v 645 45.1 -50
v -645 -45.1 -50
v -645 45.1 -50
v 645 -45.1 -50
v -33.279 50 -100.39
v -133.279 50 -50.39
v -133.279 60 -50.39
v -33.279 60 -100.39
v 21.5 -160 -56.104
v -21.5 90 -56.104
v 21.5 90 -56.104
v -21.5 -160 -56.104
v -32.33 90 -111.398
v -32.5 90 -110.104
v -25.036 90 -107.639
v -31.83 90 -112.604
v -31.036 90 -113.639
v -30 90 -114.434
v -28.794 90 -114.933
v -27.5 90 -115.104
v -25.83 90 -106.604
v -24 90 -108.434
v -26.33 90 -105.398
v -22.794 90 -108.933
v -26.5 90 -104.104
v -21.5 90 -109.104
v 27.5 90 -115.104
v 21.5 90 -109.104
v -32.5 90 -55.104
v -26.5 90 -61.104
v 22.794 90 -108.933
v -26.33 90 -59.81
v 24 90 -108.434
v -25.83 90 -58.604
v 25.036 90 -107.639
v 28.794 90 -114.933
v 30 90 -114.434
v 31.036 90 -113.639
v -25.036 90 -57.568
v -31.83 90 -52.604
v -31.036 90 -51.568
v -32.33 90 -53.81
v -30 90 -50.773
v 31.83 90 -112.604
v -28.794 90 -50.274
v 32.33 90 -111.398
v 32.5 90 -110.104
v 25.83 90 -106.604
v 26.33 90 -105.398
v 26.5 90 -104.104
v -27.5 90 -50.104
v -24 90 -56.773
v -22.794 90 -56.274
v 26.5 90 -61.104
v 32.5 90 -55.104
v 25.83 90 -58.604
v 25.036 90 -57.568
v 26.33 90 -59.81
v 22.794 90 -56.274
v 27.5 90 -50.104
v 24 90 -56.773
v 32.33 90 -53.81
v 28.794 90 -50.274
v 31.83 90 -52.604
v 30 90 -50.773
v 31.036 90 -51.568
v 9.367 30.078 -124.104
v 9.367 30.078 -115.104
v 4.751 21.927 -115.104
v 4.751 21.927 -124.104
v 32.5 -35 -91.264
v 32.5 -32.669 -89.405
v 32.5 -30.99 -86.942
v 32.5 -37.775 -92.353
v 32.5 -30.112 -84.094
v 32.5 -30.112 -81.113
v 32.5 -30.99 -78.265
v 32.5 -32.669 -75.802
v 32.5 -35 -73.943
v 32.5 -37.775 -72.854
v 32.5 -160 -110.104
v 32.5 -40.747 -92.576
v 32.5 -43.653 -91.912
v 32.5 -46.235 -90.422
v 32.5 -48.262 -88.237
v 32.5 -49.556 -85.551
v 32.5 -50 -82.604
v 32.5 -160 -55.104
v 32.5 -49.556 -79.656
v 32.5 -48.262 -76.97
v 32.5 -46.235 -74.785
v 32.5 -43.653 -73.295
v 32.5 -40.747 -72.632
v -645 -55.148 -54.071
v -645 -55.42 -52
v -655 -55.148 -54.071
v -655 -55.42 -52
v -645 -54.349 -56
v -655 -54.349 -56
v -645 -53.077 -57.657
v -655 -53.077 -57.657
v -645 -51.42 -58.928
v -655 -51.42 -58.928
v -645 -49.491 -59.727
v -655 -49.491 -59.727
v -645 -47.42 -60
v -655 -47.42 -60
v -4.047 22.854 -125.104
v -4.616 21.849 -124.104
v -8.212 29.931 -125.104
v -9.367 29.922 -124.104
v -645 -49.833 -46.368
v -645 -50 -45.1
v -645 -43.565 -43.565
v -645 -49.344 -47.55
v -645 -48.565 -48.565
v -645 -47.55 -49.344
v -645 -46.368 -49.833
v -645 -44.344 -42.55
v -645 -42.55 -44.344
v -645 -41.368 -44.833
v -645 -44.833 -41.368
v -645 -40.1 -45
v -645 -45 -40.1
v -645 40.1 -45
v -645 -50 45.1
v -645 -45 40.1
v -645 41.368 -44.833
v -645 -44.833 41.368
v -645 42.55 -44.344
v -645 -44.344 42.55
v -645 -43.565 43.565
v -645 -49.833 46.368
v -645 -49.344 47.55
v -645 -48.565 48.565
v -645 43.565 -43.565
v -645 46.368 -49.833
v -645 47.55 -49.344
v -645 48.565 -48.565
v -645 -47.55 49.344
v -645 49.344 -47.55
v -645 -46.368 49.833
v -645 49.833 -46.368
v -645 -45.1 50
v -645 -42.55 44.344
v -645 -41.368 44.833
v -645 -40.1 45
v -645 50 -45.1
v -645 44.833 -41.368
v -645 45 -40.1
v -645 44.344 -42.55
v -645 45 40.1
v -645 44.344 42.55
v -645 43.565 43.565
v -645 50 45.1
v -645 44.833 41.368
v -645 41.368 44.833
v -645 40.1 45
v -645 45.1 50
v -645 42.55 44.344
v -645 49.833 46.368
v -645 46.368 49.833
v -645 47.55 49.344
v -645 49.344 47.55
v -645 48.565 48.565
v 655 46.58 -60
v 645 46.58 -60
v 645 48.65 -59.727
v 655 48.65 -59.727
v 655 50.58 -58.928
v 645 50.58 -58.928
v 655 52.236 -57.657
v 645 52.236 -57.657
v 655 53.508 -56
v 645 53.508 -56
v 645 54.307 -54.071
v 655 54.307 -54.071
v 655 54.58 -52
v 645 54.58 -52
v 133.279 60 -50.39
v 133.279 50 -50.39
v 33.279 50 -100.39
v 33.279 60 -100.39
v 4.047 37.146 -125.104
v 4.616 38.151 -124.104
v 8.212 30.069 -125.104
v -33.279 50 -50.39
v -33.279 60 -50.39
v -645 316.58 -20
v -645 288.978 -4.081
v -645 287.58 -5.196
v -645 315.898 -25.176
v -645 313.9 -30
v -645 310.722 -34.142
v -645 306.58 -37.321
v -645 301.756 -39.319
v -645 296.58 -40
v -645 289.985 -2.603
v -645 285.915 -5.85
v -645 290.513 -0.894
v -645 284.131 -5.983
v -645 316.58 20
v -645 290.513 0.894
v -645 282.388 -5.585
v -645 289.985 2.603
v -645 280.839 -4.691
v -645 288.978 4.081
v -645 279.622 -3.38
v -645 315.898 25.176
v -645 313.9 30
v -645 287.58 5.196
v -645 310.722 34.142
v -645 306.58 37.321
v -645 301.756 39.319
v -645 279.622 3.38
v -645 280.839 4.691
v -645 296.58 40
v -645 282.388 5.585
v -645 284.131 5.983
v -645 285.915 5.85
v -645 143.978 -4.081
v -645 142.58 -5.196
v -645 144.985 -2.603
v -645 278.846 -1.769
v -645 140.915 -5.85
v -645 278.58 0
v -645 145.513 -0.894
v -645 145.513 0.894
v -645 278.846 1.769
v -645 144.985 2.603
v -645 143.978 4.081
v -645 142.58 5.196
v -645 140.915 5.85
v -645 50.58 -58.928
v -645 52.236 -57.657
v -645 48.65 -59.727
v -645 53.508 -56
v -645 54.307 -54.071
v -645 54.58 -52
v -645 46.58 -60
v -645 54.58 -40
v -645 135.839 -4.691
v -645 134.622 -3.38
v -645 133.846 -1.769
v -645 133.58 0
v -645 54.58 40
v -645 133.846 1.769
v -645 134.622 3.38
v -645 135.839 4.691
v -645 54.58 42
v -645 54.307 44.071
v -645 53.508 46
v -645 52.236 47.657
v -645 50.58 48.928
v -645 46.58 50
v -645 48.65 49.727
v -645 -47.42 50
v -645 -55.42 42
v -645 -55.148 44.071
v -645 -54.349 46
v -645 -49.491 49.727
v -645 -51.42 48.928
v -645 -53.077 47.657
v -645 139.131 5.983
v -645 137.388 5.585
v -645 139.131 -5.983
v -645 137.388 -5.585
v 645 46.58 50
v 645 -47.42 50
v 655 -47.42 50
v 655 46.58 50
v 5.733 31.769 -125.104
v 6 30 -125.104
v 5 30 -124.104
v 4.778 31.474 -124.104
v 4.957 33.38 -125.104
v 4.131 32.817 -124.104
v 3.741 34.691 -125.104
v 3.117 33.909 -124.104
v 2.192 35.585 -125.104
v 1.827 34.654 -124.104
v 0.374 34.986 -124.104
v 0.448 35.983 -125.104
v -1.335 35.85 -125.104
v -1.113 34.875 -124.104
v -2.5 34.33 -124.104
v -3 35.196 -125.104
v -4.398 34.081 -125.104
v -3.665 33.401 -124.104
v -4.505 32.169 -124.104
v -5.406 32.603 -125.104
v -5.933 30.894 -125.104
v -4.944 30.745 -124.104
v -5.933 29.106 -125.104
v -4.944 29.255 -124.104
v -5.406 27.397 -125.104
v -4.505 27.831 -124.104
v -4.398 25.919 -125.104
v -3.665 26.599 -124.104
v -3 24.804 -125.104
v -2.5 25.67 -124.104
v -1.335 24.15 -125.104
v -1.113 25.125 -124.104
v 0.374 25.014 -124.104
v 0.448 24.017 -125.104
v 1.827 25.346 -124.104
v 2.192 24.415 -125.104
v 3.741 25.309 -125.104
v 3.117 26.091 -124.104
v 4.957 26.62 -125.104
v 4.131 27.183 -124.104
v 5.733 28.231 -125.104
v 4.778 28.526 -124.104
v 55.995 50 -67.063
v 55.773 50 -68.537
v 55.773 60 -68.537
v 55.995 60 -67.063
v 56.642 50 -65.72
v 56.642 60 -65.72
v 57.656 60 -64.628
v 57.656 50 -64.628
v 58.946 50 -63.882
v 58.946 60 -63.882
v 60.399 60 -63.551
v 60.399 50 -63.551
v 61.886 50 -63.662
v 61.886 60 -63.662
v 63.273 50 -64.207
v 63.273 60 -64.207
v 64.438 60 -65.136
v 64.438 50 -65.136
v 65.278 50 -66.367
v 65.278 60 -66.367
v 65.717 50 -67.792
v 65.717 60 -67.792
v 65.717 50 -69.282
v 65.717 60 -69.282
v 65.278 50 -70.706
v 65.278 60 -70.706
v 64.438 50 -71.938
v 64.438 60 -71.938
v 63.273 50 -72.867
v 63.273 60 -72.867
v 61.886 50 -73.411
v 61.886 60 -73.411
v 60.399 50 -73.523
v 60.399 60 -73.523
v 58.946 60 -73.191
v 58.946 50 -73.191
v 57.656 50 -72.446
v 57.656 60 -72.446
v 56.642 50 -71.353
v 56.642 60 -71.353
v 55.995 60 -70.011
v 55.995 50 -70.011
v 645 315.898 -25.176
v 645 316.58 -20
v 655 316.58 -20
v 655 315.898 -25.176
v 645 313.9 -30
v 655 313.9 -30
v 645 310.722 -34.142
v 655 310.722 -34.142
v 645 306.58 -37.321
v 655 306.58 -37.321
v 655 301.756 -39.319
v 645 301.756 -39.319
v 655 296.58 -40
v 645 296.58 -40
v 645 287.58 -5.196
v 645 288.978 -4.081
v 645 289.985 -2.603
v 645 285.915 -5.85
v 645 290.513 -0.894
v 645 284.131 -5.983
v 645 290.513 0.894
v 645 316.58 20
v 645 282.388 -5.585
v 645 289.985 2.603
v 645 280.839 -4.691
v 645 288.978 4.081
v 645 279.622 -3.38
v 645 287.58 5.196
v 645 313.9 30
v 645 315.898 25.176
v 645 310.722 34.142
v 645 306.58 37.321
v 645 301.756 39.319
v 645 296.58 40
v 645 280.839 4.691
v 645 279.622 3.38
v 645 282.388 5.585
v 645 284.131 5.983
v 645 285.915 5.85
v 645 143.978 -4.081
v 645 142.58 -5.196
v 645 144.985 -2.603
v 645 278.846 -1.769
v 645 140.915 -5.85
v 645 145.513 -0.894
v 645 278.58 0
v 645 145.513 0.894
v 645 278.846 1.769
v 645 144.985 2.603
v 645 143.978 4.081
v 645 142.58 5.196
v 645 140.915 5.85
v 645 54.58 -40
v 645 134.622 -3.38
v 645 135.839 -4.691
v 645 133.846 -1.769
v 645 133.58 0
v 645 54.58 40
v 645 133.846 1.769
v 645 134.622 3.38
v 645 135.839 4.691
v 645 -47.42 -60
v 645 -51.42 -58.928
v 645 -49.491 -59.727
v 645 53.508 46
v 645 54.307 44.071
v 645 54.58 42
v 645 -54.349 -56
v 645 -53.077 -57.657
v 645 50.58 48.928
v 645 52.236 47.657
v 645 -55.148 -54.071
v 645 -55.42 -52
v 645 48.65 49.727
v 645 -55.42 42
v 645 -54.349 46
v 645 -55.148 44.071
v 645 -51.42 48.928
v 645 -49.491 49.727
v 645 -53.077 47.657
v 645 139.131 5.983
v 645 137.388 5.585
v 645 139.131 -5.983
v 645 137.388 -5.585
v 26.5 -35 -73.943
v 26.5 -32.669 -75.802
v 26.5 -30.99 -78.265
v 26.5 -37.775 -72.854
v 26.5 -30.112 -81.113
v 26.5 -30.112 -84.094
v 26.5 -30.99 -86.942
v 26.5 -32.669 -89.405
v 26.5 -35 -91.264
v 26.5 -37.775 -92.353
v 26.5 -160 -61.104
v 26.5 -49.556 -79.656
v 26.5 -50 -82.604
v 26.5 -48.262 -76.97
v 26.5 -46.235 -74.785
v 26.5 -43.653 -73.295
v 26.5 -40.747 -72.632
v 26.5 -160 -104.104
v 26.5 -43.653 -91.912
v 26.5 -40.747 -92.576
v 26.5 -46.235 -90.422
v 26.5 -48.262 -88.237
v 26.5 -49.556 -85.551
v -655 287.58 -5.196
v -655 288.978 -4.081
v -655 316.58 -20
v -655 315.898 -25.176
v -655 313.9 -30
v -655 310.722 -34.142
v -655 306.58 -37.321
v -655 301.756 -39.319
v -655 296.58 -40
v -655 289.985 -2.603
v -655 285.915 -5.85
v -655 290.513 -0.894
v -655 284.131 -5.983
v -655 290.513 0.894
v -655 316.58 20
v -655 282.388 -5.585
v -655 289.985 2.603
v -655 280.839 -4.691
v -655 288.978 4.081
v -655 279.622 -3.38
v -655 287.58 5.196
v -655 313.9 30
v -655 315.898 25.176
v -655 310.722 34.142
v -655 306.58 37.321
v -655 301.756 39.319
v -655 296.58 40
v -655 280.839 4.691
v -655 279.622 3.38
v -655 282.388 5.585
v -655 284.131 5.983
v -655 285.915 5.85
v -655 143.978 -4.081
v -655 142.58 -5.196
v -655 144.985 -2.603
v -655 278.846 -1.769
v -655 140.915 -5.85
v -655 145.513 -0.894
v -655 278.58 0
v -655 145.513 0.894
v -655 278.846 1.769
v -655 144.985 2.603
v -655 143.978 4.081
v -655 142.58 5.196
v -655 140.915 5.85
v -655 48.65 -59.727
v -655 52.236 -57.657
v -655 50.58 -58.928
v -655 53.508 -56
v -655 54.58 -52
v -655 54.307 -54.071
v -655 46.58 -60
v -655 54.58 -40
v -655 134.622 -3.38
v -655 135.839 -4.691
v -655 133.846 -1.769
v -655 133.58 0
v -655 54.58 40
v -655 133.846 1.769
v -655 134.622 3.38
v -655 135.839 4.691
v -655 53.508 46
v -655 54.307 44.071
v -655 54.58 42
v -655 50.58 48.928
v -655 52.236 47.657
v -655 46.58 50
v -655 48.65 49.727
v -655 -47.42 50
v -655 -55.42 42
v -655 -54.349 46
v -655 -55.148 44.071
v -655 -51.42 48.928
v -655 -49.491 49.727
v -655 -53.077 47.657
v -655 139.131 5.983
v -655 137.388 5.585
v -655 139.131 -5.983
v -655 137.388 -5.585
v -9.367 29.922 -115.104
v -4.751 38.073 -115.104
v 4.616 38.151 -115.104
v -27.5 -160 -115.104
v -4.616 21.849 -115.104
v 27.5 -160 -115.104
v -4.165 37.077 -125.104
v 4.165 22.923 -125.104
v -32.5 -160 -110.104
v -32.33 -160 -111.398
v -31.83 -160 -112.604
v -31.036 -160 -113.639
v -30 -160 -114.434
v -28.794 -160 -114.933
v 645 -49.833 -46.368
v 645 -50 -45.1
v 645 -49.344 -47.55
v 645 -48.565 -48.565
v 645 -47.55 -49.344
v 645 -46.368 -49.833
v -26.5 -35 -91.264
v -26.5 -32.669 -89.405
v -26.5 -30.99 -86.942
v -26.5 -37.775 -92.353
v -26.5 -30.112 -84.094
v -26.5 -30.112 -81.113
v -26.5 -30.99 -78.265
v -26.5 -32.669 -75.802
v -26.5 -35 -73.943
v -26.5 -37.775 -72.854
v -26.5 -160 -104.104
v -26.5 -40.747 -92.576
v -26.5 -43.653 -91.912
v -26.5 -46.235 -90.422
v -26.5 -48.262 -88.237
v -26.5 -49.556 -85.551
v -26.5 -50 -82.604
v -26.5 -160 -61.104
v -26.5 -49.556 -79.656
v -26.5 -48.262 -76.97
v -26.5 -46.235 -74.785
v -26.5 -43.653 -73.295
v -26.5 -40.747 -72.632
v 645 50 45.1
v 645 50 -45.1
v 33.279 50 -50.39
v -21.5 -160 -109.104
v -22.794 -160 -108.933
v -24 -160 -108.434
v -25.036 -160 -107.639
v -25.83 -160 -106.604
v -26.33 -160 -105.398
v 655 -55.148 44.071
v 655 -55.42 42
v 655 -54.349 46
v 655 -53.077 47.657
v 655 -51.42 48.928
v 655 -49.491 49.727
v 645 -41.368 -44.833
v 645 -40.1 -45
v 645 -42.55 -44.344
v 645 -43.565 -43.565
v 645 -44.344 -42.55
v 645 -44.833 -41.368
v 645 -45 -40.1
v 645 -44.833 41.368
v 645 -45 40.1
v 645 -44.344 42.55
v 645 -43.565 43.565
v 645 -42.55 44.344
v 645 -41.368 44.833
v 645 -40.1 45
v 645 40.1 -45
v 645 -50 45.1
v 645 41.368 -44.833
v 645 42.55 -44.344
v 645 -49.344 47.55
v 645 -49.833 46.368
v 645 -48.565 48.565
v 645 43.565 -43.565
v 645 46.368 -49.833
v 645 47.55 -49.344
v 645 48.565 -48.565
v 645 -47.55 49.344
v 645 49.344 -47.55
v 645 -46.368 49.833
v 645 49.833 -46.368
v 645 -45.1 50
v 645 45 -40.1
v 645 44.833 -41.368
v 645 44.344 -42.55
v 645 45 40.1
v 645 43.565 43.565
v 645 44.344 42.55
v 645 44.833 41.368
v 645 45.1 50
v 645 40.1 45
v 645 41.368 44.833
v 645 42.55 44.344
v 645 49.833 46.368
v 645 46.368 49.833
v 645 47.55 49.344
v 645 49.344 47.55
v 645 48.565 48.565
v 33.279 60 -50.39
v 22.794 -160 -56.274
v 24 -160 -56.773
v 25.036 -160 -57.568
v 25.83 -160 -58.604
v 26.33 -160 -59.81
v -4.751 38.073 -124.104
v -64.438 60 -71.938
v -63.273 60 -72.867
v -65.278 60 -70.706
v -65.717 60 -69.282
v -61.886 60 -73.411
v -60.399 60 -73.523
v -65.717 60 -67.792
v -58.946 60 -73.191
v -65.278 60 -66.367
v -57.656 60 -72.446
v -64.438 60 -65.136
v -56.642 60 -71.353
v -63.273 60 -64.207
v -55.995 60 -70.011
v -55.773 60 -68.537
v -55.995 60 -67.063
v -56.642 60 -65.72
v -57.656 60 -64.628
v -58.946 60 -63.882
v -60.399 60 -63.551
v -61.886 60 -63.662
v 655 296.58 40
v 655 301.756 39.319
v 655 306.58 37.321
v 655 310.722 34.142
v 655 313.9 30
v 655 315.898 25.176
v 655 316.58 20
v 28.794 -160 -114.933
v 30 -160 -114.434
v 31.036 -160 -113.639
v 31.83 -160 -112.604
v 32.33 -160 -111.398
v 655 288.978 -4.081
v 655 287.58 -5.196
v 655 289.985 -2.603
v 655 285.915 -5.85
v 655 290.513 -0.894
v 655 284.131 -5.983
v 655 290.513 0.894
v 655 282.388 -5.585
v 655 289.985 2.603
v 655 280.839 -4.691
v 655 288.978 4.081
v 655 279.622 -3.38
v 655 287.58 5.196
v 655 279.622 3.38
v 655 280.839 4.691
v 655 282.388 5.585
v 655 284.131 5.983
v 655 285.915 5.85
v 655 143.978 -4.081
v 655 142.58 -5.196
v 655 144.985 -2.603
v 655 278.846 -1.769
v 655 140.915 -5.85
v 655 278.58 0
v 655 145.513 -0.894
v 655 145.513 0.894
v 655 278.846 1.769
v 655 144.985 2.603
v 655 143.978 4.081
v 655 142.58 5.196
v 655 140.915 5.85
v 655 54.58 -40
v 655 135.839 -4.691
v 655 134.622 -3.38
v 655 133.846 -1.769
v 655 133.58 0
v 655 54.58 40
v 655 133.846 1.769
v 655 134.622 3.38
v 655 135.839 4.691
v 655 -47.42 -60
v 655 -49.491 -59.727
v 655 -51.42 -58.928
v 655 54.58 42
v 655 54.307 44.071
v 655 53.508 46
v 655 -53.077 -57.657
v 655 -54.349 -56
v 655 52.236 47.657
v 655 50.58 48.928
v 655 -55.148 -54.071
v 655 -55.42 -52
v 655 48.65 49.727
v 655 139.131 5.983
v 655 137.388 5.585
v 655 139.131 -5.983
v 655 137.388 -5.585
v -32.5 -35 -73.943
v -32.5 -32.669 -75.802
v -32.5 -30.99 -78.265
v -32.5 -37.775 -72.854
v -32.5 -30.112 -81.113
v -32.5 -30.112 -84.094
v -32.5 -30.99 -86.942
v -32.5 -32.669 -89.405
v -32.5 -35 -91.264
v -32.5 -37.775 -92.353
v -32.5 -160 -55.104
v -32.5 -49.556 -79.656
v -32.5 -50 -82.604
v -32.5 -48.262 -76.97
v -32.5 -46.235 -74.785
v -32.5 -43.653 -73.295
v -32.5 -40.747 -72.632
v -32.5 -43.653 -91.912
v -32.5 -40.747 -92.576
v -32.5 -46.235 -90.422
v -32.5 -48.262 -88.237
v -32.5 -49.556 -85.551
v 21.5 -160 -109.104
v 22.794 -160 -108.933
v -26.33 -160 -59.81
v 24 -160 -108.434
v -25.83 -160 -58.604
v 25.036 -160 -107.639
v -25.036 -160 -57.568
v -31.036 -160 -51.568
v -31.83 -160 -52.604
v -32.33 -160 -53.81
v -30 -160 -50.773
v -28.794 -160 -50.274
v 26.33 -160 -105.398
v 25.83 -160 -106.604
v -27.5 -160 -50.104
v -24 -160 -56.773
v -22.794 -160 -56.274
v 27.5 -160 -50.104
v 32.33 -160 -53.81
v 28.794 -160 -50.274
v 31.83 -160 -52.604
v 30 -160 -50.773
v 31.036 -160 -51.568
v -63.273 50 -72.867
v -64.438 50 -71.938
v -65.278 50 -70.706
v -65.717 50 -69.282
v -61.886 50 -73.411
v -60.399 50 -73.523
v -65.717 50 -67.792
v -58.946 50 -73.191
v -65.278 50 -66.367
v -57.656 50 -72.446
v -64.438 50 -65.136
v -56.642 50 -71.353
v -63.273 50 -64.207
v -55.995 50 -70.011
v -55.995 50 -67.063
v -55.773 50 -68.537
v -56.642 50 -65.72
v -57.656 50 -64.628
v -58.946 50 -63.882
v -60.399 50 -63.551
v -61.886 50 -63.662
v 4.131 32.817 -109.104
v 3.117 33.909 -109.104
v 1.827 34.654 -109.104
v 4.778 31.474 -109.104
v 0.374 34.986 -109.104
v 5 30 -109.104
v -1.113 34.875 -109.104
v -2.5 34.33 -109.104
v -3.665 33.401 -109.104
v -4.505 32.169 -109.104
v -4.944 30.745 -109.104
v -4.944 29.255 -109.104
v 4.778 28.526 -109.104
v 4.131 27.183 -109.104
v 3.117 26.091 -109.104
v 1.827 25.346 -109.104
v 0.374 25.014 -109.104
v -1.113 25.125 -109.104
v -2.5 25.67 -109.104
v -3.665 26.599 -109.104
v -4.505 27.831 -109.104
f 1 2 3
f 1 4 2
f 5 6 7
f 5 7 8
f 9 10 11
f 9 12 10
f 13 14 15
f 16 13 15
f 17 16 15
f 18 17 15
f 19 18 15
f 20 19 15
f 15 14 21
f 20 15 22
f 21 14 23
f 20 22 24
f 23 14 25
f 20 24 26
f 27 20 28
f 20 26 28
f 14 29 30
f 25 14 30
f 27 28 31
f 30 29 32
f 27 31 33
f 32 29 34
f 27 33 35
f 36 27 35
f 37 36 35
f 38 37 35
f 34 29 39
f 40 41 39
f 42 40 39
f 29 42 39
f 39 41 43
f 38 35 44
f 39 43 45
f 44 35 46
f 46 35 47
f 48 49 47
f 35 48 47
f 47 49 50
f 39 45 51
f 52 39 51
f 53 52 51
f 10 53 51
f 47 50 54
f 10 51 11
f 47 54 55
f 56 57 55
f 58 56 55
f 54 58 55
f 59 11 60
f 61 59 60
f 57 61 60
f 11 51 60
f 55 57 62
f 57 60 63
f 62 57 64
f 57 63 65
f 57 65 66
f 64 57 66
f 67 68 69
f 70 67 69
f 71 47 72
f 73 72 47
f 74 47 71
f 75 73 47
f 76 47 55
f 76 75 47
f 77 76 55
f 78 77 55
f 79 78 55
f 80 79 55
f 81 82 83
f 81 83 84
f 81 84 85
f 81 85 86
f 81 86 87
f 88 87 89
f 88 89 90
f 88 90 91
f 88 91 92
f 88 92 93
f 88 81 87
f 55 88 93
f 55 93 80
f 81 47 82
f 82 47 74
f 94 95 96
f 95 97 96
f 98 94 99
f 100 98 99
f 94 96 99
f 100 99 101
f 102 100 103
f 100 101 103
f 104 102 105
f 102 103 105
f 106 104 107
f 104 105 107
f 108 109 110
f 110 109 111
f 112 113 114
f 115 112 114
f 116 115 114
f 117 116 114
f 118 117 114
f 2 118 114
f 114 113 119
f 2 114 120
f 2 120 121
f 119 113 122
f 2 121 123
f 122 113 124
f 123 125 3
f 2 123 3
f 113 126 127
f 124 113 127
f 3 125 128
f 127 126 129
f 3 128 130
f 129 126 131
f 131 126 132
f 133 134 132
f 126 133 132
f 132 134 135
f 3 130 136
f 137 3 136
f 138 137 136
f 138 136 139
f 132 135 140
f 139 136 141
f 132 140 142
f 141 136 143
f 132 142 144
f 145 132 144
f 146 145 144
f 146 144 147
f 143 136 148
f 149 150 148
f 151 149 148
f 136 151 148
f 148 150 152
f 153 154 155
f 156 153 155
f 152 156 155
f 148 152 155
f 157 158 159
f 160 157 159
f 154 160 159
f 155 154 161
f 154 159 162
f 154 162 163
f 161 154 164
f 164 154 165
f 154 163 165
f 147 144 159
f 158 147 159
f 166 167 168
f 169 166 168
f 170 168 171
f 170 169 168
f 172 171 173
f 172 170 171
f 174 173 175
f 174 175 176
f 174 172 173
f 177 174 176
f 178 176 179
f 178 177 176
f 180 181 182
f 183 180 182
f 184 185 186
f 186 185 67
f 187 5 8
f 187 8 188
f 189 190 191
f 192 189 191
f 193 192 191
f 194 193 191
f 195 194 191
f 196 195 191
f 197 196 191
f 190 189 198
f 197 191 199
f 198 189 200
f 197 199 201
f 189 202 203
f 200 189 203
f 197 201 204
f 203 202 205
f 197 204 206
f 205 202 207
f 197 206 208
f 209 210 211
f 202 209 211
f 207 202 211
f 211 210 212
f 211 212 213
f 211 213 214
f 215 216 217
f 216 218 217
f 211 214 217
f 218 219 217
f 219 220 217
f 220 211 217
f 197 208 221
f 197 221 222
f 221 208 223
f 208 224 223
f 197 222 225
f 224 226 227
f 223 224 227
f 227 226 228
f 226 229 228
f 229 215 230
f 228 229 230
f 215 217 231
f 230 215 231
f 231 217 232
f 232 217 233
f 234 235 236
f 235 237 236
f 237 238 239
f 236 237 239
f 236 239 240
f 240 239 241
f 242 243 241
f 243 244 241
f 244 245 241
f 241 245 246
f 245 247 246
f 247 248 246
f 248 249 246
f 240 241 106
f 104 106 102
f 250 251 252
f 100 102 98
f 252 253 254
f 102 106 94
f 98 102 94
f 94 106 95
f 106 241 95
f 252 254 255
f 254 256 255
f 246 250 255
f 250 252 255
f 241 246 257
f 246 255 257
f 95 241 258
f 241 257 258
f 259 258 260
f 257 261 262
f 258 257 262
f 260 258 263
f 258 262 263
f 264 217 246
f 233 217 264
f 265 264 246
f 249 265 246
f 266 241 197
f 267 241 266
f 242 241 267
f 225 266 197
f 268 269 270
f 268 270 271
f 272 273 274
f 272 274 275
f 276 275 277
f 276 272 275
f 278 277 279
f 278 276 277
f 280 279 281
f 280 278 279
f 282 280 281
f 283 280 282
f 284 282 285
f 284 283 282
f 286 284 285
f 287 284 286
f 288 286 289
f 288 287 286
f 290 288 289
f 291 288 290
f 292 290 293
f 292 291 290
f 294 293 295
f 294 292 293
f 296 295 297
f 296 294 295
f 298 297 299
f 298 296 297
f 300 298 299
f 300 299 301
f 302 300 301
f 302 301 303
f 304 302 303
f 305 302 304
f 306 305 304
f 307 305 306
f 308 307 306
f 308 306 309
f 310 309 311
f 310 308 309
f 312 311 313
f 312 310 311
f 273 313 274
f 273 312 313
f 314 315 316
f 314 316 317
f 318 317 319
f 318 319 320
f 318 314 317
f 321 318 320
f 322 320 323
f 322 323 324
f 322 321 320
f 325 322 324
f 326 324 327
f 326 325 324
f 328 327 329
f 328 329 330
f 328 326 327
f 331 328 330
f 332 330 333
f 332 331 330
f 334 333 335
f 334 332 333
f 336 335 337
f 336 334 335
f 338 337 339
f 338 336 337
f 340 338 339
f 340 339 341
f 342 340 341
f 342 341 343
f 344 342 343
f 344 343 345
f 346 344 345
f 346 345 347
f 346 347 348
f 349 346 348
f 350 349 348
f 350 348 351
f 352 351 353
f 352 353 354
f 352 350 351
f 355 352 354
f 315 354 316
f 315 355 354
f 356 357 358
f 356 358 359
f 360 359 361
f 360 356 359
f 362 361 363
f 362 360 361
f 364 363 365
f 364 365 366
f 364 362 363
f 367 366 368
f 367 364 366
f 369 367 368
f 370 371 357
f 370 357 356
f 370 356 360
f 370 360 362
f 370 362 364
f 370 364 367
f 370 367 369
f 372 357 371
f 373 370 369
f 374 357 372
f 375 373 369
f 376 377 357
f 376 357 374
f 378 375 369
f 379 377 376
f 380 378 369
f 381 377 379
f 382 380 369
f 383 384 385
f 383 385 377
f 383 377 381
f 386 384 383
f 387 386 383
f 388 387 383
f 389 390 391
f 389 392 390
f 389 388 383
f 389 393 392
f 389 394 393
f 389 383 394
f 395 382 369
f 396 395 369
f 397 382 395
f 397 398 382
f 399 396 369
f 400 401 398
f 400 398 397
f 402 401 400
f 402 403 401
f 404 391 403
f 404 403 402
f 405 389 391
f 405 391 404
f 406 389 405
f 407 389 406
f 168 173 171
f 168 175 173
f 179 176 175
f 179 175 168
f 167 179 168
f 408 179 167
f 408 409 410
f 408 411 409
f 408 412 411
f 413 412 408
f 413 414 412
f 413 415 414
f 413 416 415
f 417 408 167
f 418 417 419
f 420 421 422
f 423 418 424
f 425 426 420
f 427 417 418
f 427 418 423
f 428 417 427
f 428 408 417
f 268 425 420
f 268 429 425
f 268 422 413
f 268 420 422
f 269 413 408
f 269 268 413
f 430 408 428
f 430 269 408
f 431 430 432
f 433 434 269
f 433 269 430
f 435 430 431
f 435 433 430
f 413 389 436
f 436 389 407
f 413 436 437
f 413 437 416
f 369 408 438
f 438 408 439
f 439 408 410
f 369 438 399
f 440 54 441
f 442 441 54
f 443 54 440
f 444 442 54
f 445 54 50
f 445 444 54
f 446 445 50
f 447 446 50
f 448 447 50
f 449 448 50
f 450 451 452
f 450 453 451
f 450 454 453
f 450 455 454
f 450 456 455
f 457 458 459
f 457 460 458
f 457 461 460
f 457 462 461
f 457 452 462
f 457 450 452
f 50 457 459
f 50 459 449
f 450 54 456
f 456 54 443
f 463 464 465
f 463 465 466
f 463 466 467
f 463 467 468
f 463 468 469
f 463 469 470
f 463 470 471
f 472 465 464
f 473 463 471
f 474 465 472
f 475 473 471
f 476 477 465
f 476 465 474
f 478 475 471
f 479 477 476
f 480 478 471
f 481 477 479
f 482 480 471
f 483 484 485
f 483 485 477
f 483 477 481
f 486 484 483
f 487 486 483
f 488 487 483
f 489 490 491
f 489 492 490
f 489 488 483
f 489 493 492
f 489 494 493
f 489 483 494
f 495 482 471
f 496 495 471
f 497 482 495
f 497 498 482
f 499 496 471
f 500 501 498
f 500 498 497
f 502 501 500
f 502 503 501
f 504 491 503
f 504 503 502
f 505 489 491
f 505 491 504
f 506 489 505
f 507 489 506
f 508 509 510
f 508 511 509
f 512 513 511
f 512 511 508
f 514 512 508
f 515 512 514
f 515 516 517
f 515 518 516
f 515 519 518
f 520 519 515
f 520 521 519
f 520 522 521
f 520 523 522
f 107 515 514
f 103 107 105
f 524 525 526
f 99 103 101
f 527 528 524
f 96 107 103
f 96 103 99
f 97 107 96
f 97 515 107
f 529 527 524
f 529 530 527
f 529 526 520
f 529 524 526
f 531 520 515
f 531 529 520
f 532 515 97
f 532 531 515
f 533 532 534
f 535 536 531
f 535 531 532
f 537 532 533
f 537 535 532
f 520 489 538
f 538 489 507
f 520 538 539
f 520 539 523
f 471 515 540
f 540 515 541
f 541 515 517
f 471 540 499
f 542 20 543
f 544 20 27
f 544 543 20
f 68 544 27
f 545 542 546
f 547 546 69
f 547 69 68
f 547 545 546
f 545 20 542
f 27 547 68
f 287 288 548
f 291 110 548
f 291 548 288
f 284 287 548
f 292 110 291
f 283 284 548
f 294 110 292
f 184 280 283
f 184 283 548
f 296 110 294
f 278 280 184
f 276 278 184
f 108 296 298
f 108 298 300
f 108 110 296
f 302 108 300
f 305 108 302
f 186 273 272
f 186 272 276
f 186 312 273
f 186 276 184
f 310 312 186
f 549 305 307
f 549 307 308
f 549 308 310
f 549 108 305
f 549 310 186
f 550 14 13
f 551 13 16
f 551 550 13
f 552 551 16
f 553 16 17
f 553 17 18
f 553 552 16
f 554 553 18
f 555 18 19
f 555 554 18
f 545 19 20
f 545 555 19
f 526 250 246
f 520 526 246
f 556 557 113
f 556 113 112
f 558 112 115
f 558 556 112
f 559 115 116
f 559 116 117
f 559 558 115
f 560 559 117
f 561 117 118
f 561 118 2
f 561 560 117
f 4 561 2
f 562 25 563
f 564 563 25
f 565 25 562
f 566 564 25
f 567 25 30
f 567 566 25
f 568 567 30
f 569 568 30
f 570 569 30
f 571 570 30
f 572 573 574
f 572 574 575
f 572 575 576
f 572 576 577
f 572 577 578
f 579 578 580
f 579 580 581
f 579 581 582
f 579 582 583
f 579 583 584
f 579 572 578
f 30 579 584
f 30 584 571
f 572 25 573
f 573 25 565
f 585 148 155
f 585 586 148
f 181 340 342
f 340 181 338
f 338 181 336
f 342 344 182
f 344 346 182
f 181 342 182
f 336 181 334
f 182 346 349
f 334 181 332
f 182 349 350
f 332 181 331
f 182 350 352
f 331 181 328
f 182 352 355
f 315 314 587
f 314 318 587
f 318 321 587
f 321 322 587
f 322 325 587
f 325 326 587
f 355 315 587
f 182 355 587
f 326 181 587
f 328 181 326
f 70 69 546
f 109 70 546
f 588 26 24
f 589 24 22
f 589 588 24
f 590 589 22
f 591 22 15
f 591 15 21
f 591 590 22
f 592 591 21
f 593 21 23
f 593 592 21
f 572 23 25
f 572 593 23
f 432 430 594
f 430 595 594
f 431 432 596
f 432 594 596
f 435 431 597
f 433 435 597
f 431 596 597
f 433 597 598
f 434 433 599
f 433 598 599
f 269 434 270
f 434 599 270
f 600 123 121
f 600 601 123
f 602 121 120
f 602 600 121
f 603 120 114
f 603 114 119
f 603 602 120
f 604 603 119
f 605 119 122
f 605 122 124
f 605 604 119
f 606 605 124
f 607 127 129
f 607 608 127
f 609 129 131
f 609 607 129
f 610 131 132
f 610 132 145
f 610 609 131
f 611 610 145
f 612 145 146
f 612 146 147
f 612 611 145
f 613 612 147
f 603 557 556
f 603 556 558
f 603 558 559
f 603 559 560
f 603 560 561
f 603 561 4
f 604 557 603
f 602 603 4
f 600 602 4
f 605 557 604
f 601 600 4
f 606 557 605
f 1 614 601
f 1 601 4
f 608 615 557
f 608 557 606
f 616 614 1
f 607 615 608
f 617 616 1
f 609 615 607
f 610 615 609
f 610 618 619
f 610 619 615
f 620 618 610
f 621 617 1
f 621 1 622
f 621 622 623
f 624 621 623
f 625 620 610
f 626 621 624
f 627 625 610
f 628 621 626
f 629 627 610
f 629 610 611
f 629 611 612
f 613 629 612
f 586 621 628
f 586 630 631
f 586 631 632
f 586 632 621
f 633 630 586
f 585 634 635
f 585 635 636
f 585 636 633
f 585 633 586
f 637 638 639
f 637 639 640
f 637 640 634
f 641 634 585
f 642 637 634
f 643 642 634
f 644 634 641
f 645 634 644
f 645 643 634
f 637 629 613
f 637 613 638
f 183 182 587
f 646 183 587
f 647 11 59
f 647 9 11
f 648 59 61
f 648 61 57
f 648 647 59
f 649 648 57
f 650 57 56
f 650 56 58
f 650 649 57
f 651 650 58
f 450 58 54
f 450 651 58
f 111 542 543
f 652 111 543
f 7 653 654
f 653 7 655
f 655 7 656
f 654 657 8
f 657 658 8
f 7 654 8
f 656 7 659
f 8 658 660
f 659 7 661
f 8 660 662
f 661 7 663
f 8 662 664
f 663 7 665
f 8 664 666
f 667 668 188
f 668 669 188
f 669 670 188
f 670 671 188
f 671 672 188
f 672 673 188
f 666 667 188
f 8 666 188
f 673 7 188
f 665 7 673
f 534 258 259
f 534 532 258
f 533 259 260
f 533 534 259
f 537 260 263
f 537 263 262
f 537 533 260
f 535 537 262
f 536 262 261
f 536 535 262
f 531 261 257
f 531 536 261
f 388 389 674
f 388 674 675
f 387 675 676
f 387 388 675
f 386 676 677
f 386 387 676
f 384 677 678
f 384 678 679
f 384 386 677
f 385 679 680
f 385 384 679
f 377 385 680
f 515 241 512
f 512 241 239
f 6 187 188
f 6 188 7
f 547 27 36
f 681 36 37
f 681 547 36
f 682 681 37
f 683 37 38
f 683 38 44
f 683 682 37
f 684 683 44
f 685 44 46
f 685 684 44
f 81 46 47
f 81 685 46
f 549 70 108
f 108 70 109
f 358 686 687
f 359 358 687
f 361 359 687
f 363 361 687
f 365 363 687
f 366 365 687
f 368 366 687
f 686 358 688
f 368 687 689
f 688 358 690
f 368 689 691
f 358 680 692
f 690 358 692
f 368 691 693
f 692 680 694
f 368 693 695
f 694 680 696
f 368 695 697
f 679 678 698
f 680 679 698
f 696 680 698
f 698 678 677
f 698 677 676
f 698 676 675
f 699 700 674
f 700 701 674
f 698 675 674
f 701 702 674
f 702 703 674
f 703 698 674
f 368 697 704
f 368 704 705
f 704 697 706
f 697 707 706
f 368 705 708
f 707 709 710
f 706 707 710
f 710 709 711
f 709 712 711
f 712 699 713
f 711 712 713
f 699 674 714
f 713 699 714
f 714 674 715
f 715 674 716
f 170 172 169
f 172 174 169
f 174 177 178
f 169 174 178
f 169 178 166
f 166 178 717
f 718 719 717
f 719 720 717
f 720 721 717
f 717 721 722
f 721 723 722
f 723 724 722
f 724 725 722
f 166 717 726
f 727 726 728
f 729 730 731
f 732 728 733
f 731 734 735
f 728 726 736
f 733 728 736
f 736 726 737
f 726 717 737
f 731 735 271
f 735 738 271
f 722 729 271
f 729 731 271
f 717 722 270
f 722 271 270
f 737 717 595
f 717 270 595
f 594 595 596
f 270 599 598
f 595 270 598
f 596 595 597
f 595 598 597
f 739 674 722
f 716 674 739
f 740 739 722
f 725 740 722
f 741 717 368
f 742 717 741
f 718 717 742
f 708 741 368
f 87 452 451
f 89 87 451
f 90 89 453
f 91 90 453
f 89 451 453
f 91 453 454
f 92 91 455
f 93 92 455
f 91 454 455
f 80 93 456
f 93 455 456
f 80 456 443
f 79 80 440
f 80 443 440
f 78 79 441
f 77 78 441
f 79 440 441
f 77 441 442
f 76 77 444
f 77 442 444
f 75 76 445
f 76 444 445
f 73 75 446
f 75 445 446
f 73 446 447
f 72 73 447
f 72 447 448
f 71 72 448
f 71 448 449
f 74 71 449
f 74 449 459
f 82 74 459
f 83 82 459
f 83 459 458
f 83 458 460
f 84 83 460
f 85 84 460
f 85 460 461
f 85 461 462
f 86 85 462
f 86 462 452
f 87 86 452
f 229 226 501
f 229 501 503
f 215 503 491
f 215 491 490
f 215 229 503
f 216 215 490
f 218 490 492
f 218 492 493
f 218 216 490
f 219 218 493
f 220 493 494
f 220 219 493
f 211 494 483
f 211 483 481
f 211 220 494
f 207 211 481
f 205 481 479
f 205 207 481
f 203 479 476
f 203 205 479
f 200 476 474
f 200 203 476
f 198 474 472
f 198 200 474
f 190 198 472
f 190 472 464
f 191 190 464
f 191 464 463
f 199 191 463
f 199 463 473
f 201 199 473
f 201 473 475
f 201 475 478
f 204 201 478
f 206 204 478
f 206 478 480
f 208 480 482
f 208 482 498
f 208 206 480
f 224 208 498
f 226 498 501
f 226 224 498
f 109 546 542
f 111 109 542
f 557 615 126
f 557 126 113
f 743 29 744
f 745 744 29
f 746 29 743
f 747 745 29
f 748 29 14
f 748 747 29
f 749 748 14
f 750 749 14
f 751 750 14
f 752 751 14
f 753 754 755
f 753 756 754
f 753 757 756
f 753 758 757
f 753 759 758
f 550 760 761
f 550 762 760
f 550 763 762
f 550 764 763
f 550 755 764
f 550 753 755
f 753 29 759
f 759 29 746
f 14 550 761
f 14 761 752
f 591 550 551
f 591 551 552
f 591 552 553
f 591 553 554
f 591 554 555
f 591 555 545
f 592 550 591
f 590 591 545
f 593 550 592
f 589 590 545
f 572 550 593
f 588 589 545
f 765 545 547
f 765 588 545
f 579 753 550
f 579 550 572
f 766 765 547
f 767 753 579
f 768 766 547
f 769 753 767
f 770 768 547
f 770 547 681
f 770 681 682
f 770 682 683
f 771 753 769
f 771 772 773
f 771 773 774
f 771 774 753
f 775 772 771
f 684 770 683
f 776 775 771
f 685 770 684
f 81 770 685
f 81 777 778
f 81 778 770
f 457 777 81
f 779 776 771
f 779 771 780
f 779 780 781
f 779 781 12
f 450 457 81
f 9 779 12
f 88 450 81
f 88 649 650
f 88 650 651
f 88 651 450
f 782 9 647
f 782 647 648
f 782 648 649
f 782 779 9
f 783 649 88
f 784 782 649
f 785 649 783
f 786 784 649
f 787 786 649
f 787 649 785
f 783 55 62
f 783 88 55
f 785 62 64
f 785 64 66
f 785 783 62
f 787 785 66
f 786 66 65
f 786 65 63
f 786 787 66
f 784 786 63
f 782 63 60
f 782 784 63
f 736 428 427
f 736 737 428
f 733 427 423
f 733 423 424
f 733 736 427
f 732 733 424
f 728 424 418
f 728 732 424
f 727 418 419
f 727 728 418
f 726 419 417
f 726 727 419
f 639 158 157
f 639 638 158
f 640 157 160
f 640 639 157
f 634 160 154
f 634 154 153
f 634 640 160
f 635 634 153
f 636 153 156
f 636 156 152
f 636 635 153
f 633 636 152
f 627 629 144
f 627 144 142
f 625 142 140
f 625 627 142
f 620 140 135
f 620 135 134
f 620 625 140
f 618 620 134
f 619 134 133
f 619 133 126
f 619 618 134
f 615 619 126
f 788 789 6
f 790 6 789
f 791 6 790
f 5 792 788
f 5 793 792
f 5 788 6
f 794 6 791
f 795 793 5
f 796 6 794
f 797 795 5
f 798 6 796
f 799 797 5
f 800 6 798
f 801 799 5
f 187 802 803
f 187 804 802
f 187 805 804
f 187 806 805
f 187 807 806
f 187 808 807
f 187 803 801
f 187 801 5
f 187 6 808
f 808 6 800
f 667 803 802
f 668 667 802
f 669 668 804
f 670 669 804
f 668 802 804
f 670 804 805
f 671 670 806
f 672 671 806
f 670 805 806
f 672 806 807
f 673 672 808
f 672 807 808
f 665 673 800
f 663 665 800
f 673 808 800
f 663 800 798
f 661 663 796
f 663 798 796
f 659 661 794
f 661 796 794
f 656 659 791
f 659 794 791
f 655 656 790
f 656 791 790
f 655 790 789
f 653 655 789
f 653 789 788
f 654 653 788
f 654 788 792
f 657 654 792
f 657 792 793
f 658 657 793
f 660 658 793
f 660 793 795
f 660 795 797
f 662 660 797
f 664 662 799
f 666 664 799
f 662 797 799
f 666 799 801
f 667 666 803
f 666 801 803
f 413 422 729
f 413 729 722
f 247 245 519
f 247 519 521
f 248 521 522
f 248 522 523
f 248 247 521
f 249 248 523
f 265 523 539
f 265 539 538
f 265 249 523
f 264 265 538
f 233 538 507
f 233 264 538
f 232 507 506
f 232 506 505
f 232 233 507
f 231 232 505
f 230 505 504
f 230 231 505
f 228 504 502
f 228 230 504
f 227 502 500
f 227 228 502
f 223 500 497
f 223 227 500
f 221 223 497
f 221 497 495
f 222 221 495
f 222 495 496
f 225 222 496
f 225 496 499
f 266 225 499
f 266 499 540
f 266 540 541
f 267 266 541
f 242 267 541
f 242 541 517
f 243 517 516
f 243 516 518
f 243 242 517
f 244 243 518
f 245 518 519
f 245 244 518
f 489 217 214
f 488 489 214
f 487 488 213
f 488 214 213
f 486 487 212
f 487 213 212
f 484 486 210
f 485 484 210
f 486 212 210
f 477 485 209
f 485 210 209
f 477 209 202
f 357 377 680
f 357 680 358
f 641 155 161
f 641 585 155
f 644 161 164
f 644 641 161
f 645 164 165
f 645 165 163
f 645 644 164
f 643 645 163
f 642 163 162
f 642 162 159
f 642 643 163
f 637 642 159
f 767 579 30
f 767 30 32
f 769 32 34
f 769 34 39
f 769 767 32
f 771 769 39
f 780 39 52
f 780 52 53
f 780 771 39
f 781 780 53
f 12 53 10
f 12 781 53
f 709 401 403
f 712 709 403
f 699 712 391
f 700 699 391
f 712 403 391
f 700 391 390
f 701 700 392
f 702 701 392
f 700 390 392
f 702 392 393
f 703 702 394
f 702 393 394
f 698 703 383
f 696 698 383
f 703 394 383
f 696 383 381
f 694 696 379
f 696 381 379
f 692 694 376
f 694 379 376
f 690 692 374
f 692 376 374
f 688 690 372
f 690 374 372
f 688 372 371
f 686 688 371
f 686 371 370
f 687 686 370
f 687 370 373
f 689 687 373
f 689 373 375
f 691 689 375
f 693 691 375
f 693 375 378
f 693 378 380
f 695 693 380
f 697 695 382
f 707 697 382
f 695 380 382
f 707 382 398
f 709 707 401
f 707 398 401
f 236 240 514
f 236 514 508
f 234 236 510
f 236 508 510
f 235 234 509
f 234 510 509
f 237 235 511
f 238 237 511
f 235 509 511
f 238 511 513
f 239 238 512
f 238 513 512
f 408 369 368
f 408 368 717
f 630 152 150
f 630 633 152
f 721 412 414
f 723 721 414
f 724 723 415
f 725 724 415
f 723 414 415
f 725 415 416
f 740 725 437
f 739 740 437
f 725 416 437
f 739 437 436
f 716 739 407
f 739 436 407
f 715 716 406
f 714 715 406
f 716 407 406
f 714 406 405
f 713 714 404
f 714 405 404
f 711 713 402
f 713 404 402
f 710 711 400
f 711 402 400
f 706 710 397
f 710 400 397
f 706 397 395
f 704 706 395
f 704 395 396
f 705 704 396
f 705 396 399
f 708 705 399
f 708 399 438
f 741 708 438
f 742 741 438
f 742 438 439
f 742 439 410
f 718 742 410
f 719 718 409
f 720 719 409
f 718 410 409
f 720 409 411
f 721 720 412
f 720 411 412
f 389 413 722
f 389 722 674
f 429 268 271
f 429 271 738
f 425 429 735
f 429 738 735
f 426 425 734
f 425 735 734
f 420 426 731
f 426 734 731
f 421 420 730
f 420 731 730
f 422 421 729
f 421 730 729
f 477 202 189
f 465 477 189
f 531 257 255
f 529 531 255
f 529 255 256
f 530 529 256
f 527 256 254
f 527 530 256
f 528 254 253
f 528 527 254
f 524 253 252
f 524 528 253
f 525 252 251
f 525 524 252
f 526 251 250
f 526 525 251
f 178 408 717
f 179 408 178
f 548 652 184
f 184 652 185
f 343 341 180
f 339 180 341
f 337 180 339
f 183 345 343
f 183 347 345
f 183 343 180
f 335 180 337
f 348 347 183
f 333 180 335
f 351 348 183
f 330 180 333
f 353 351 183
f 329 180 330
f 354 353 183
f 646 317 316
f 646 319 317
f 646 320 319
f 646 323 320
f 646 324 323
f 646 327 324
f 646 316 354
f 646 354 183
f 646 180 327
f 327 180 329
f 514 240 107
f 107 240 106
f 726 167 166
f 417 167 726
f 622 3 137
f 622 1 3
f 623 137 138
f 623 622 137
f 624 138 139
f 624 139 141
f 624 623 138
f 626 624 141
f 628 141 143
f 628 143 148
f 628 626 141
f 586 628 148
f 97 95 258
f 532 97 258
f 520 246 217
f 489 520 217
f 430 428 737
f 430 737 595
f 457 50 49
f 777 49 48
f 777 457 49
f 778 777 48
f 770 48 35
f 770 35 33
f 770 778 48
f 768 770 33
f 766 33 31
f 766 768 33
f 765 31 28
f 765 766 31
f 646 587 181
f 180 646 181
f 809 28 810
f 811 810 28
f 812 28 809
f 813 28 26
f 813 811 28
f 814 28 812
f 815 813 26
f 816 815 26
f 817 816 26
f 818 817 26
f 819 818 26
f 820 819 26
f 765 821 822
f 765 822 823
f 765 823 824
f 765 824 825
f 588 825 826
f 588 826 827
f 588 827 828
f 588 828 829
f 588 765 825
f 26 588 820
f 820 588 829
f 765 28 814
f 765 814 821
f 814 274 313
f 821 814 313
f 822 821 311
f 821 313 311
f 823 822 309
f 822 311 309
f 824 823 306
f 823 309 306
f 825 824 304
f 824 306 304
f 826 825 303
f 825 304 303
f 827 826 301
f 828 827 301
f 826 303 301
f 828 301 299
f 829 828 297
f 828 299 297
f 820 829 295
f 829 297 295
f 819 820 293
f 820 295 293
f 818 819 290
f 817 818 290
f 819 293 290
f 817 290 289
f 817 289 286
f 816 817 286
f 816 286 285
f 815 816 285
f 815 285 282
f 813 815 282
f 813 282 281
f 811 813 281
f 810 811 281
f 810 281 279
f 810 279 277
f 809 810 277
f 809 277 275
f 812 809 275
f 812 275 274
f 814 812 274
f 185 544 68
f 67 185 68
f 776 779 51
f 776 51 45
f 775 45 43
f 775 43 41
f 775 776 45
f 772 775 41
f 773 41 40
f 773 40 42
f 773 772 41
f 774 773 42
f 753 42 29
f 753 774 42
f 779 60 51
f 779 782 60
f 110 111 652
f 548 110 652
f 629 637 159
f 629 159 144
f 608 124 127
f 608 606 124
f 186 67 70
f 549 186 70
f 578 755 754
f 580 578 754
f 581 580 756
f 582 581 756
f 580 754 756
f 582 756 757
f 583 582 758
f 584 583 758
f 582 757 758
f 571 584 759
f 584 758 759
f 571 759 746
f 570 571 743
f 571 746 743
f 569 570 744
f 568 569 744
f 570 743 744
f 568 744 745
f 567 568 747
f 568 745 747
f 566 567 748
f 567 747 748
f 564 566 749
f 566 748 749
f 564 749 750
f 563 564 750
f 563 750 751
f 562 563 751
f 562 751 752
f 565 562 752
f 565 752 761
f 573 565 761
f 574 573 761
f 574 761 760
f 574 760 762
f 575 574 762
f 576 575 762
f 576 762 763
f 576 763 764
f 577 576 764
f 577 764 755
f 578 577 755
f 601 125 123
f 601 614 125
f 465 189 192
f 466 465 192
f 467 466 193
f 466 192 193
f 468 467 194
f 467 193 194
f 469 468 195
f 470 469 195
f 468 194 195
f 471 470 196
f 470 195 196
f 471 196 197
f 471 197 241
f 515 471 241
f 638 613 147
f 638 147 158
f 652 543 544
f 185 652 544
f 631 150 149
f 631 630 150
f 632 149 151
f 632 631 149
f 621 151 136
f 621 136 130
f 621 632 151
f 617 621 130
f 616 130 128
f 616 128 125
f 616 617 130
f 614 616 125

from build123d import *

# Parameters (mm, degrees)
F1_DEPTH       = 645
F1_DEPTH_BACK  = 645
F2_R           = 6
F3_DEPTH       = 10
F4_R           = 8
F7_DEPTH       = 110
F7_DEPTH_BACK  = 140
F8_R           = 10
F9_DEPTH       = 259
F11_DEPTH      = 10
F12_R          = 5
F13_DEPTH      = 25
F13_DEPTH_BACK = 25.8
F14_SIZE       = 1
F15_R          = 5
F16_DEPTH      = 10


with BuildPart() as f1:
    # F0 (on Right) → F1 (new body, two sides)
    with BuildSketch(Plane.YZ) as f1_sk:
        with BuildLine():
            ThreePointArc((50, 45.1), (48.5648232278, 48.5648232278), (45.1, 50))
            Line((45.1, 50), (-45.1, 50))
            ThreePointArc((-45.1, 50), (-48.5648232278, 48.5648232278), (-50, 45.1))
            Line((-50, 45.1), (-50, -45.1))
            ThreePointArc((-50, -45.1), (-48.5648232278, -48.5648232278), (-45.1, -50))
            Line((-45.1, -50), (45.1, -50))
            ThreePointArc((45.1, -50), (48.5648232278, -48.5648232278), (50, -45.1))
            Line((50, -45.1), (50, 45.1))
        make_face()
        with BuildLine():
            Line((-40.1, 45), (40.1, 45))
            ThreePointArc((40.1, 45), (43.5648232278, 43.5648232278), (45, 40.1))
            Line((45, 40.1), (45, -40.1))
            ThreePointArc((45, -40.1), (43.5648232278, -43.5648232278), (40.1, -45))
            Line((40.1, -45), (-40.1, -45))
            ThreePointArc((-40.1, -45), (-43.5648232278, -43.5648232278), (-45, -40.1))
            Line((-45, -40.1), (-45, 40.1))
            ThreePointArc((-45, 40.1), (-43.5648232278, 43.5648232278), (-40.1, 45))
        make_face(mode=Mode.SUBTRACT)
    extrude(amount=F1_DEPTH)
    extrude(f1_sk.sketch, amount=-F1_DEPTH_BACK)


with BuildPart() as f3:
    # F2 (on face) → F3 (new body)
    with BuildSketch(Plane(origin=(-645, 0, 0), x_dir=(0, -1, 0), z_dir=(-1, 0, 0))):
        with BuildLine():
            Line((55.4204173386, -60), (55.4204173386, 50))
            Line((55.4204173386, 50), (-54.5795826614, 50))
            Line((-54.5795826614, 50), (-54.5795826614, 40))
            Line((-54.5795826614, 40), (-296.5795826614, 40))
            ThreePointArc((-296.5795826614, 40), (-310.7217182851, 34.1421356237), (-316.5795826614, 20))
            Line((-316.5795826614, 20), (-316.5795826614, -20))
            ThreePointArc((-316.5795826614, -20), (-310.7217182851, -34.1421356237), (-296.5795826614, -40))
            Line((-296.5795826614, -40), (-54.5795826614, -40))
            Line((-54.5795826614, -40), (-54.5795826614, -60))
            Line((-54.5795826614, -60), (55.4204173386, -60))
        make_face()
        with Locations((-284.5795826614, 0)):
            Circle(F2_R, mode=Mode.SUBTRACT)
        with Locations((-139.5795826614, 0)):
            Circle(F2_R, mode=Mode.SUBTRACT)
    extrude(amount=F3_DEPTH)

    # F4
    f4_edges = [f3.edges().sort_by_distance(p)[0] for p in [
        (-650, 54.579583, 50),
        (-650, -55.420417, 50),
        (-650, -55.420417, -60),
        (-650, 54.579583, -60),
    ]]
    fillet(f4_edges, radius=F4_R)


with BuildPart() as f5_1:
    # F5: instance of F3
    add(f3.part.mirror(Plane.YZ))


with BuildPart() as f7:
    # F6 (on face) → F7 (new body, two sides)
    with BuildSketch(Plane.XZ.offset(50)) as f7_sk:
        with BuildLine():
            Line((27.5, -50.103611052), (-27.5, -50.103611052))
            ThreePointArc((-27.5, -50.103611052), (-31.0355339059, -51.5680771461), (-32.5, -55.103611052))
            Line((-32.5, -55.103611052), (-32.5, -110.103611052))
            ThreePointArc((-32.5, -110.103611052), (-31.0355339059, -113.639144958), (-27.5, -115.103611052))
            Line((-27.5, -115.103611052), (27.5, -115.103611052))
            ThreePointArc((27.5, -115.103611052), (31.0355339059, -113.639144958), (32.5, -110.103611052))
            Line((32.5, -110.103611052), (32.5, -55.103611052))
            ThreePointArc((32.5, -55.103611052), (31.0355339059, -51.5680771461), (27.5, -50.103611052))
        make_face()
        with BuildLine():
            ThreePointArc((-26.5, -61.103611052), (-25.0355339059, -57.5680771461), (-21.5, -56.103611052))
            Line((-21.5, -56.103611052), (21.5, -56.103611052))
            ThreePointArc((21.5, -56.103611052), (25.0355339059, -57.5680771461), (26.5, -61.103611052))
            Line((26.5, -61.103611052), (26.5, -104.103611052))
            ThreePointArc((26.5, -104.103611052), (25.0355339059, -107.639144958), (21.5, -109.103611052))
            Line((21.5, -109.103611052), (-21.5, -109.103611052))
            ThreePointArc((-21.5, -109.103611052), (-25.0355339059, -107.639144958), (-26.5, -104.103611052))
            Line((-26.5, -104.103611052), (-26.5, -61.103611052))
        make_face(mode=Mode.SUBTRACT)
    extrude(amount=F7_DEPTH)
    extrude(f7_sk.sketch, amount=-F7_DEPTH_BACK)

    # F8 (on face) → F9 (cut)
    with BuildSketch(Plane(origin=(-32.5, 0, 0), x_dir=(0, -1, 0), z_dir=(-1, 0, 0))):
        with Locations((40, -82.603611052)):
            Circle(F8_R)
    extrude(amount=-F9_DEPTH, mode=Mode.SUBTRACT)

    # F10 (on face) → F11 (join)
    with BuildSketch(Plane(origin=(0, 0, -115.103611052), x_dir=(1, 0, 0), z_dir=(0, 0, -1))):
        Polygon((-4.6155781431, -21.8492146033), (-9.3665762859, -29.9218152267), (-4.7509981428, -38.0726006234), (4.6155781431, -38.1507853967), (9.3665762859, -30.0781847733), (4.7509981428, -21.9273993766), align=None)
    extrude(amount=F11_DEPTH)

    # F12 (on face) → F13 (cut, two sides)
    with BuildSketch(Plane(origin=(0, 0, -115.103611052), x_dir=(1, 0, 0), z_dir=(0, 0, -1))) as f13_sk:
        with Locations((0, -30)):
            Circle(F12_R)
    extrude(amount=-F13_DEPTH, mode=Mode.SUBTRACT)
    extrude(f13_sk.sketch, amount=F13_DEPTH_BACK, mode=Mode.SUBTRACT)

    # F14
    f14_edges = [f7.edges().sort_by_distance(p)[0] for p in [
        (0.06771, 21.888307, -125.103611),
        (7.058787, 26.002792, -125.103611),
        (-6.991077, 25.885515, -125.103611),
        (6.991077, 34.114485, -125.103611),
        (-7.058787, 33.997208, -125.103611),
        (-0.06771, 38.111693, -125.103611),
        (-5, 30, -125.103611),
    ]]
    chamfer(f14_edges, length=F14_SIZE)


with BuildPart() as f16:
    # F15 (on face) → F16 (new body)
    with BuildSketch(Plane(origin=(0, 50, 0), x_dir=(-1, 0, 0), z_dir=(0, 1, 0))):
        Polygon((-33.2786262035, -100.390178534), (-33.2786262035, -50.390178534), (-133.2786262035, -50.390178534), align=None)
        with Locations((-60.7731044292, -68.5368180275)):
            Circle(F15_R, mode=Mode.SUBTRACT)
    extrude(amount=F16_DEPTH)


with BuildPart() as f17_1:
    # F17: instance of F16
    add(f16.part.mirror(Plane.YZ))


solid = Compound([f1.part, f3.part, f5_1.part, f7.part, f16.part, f17_1.part])
